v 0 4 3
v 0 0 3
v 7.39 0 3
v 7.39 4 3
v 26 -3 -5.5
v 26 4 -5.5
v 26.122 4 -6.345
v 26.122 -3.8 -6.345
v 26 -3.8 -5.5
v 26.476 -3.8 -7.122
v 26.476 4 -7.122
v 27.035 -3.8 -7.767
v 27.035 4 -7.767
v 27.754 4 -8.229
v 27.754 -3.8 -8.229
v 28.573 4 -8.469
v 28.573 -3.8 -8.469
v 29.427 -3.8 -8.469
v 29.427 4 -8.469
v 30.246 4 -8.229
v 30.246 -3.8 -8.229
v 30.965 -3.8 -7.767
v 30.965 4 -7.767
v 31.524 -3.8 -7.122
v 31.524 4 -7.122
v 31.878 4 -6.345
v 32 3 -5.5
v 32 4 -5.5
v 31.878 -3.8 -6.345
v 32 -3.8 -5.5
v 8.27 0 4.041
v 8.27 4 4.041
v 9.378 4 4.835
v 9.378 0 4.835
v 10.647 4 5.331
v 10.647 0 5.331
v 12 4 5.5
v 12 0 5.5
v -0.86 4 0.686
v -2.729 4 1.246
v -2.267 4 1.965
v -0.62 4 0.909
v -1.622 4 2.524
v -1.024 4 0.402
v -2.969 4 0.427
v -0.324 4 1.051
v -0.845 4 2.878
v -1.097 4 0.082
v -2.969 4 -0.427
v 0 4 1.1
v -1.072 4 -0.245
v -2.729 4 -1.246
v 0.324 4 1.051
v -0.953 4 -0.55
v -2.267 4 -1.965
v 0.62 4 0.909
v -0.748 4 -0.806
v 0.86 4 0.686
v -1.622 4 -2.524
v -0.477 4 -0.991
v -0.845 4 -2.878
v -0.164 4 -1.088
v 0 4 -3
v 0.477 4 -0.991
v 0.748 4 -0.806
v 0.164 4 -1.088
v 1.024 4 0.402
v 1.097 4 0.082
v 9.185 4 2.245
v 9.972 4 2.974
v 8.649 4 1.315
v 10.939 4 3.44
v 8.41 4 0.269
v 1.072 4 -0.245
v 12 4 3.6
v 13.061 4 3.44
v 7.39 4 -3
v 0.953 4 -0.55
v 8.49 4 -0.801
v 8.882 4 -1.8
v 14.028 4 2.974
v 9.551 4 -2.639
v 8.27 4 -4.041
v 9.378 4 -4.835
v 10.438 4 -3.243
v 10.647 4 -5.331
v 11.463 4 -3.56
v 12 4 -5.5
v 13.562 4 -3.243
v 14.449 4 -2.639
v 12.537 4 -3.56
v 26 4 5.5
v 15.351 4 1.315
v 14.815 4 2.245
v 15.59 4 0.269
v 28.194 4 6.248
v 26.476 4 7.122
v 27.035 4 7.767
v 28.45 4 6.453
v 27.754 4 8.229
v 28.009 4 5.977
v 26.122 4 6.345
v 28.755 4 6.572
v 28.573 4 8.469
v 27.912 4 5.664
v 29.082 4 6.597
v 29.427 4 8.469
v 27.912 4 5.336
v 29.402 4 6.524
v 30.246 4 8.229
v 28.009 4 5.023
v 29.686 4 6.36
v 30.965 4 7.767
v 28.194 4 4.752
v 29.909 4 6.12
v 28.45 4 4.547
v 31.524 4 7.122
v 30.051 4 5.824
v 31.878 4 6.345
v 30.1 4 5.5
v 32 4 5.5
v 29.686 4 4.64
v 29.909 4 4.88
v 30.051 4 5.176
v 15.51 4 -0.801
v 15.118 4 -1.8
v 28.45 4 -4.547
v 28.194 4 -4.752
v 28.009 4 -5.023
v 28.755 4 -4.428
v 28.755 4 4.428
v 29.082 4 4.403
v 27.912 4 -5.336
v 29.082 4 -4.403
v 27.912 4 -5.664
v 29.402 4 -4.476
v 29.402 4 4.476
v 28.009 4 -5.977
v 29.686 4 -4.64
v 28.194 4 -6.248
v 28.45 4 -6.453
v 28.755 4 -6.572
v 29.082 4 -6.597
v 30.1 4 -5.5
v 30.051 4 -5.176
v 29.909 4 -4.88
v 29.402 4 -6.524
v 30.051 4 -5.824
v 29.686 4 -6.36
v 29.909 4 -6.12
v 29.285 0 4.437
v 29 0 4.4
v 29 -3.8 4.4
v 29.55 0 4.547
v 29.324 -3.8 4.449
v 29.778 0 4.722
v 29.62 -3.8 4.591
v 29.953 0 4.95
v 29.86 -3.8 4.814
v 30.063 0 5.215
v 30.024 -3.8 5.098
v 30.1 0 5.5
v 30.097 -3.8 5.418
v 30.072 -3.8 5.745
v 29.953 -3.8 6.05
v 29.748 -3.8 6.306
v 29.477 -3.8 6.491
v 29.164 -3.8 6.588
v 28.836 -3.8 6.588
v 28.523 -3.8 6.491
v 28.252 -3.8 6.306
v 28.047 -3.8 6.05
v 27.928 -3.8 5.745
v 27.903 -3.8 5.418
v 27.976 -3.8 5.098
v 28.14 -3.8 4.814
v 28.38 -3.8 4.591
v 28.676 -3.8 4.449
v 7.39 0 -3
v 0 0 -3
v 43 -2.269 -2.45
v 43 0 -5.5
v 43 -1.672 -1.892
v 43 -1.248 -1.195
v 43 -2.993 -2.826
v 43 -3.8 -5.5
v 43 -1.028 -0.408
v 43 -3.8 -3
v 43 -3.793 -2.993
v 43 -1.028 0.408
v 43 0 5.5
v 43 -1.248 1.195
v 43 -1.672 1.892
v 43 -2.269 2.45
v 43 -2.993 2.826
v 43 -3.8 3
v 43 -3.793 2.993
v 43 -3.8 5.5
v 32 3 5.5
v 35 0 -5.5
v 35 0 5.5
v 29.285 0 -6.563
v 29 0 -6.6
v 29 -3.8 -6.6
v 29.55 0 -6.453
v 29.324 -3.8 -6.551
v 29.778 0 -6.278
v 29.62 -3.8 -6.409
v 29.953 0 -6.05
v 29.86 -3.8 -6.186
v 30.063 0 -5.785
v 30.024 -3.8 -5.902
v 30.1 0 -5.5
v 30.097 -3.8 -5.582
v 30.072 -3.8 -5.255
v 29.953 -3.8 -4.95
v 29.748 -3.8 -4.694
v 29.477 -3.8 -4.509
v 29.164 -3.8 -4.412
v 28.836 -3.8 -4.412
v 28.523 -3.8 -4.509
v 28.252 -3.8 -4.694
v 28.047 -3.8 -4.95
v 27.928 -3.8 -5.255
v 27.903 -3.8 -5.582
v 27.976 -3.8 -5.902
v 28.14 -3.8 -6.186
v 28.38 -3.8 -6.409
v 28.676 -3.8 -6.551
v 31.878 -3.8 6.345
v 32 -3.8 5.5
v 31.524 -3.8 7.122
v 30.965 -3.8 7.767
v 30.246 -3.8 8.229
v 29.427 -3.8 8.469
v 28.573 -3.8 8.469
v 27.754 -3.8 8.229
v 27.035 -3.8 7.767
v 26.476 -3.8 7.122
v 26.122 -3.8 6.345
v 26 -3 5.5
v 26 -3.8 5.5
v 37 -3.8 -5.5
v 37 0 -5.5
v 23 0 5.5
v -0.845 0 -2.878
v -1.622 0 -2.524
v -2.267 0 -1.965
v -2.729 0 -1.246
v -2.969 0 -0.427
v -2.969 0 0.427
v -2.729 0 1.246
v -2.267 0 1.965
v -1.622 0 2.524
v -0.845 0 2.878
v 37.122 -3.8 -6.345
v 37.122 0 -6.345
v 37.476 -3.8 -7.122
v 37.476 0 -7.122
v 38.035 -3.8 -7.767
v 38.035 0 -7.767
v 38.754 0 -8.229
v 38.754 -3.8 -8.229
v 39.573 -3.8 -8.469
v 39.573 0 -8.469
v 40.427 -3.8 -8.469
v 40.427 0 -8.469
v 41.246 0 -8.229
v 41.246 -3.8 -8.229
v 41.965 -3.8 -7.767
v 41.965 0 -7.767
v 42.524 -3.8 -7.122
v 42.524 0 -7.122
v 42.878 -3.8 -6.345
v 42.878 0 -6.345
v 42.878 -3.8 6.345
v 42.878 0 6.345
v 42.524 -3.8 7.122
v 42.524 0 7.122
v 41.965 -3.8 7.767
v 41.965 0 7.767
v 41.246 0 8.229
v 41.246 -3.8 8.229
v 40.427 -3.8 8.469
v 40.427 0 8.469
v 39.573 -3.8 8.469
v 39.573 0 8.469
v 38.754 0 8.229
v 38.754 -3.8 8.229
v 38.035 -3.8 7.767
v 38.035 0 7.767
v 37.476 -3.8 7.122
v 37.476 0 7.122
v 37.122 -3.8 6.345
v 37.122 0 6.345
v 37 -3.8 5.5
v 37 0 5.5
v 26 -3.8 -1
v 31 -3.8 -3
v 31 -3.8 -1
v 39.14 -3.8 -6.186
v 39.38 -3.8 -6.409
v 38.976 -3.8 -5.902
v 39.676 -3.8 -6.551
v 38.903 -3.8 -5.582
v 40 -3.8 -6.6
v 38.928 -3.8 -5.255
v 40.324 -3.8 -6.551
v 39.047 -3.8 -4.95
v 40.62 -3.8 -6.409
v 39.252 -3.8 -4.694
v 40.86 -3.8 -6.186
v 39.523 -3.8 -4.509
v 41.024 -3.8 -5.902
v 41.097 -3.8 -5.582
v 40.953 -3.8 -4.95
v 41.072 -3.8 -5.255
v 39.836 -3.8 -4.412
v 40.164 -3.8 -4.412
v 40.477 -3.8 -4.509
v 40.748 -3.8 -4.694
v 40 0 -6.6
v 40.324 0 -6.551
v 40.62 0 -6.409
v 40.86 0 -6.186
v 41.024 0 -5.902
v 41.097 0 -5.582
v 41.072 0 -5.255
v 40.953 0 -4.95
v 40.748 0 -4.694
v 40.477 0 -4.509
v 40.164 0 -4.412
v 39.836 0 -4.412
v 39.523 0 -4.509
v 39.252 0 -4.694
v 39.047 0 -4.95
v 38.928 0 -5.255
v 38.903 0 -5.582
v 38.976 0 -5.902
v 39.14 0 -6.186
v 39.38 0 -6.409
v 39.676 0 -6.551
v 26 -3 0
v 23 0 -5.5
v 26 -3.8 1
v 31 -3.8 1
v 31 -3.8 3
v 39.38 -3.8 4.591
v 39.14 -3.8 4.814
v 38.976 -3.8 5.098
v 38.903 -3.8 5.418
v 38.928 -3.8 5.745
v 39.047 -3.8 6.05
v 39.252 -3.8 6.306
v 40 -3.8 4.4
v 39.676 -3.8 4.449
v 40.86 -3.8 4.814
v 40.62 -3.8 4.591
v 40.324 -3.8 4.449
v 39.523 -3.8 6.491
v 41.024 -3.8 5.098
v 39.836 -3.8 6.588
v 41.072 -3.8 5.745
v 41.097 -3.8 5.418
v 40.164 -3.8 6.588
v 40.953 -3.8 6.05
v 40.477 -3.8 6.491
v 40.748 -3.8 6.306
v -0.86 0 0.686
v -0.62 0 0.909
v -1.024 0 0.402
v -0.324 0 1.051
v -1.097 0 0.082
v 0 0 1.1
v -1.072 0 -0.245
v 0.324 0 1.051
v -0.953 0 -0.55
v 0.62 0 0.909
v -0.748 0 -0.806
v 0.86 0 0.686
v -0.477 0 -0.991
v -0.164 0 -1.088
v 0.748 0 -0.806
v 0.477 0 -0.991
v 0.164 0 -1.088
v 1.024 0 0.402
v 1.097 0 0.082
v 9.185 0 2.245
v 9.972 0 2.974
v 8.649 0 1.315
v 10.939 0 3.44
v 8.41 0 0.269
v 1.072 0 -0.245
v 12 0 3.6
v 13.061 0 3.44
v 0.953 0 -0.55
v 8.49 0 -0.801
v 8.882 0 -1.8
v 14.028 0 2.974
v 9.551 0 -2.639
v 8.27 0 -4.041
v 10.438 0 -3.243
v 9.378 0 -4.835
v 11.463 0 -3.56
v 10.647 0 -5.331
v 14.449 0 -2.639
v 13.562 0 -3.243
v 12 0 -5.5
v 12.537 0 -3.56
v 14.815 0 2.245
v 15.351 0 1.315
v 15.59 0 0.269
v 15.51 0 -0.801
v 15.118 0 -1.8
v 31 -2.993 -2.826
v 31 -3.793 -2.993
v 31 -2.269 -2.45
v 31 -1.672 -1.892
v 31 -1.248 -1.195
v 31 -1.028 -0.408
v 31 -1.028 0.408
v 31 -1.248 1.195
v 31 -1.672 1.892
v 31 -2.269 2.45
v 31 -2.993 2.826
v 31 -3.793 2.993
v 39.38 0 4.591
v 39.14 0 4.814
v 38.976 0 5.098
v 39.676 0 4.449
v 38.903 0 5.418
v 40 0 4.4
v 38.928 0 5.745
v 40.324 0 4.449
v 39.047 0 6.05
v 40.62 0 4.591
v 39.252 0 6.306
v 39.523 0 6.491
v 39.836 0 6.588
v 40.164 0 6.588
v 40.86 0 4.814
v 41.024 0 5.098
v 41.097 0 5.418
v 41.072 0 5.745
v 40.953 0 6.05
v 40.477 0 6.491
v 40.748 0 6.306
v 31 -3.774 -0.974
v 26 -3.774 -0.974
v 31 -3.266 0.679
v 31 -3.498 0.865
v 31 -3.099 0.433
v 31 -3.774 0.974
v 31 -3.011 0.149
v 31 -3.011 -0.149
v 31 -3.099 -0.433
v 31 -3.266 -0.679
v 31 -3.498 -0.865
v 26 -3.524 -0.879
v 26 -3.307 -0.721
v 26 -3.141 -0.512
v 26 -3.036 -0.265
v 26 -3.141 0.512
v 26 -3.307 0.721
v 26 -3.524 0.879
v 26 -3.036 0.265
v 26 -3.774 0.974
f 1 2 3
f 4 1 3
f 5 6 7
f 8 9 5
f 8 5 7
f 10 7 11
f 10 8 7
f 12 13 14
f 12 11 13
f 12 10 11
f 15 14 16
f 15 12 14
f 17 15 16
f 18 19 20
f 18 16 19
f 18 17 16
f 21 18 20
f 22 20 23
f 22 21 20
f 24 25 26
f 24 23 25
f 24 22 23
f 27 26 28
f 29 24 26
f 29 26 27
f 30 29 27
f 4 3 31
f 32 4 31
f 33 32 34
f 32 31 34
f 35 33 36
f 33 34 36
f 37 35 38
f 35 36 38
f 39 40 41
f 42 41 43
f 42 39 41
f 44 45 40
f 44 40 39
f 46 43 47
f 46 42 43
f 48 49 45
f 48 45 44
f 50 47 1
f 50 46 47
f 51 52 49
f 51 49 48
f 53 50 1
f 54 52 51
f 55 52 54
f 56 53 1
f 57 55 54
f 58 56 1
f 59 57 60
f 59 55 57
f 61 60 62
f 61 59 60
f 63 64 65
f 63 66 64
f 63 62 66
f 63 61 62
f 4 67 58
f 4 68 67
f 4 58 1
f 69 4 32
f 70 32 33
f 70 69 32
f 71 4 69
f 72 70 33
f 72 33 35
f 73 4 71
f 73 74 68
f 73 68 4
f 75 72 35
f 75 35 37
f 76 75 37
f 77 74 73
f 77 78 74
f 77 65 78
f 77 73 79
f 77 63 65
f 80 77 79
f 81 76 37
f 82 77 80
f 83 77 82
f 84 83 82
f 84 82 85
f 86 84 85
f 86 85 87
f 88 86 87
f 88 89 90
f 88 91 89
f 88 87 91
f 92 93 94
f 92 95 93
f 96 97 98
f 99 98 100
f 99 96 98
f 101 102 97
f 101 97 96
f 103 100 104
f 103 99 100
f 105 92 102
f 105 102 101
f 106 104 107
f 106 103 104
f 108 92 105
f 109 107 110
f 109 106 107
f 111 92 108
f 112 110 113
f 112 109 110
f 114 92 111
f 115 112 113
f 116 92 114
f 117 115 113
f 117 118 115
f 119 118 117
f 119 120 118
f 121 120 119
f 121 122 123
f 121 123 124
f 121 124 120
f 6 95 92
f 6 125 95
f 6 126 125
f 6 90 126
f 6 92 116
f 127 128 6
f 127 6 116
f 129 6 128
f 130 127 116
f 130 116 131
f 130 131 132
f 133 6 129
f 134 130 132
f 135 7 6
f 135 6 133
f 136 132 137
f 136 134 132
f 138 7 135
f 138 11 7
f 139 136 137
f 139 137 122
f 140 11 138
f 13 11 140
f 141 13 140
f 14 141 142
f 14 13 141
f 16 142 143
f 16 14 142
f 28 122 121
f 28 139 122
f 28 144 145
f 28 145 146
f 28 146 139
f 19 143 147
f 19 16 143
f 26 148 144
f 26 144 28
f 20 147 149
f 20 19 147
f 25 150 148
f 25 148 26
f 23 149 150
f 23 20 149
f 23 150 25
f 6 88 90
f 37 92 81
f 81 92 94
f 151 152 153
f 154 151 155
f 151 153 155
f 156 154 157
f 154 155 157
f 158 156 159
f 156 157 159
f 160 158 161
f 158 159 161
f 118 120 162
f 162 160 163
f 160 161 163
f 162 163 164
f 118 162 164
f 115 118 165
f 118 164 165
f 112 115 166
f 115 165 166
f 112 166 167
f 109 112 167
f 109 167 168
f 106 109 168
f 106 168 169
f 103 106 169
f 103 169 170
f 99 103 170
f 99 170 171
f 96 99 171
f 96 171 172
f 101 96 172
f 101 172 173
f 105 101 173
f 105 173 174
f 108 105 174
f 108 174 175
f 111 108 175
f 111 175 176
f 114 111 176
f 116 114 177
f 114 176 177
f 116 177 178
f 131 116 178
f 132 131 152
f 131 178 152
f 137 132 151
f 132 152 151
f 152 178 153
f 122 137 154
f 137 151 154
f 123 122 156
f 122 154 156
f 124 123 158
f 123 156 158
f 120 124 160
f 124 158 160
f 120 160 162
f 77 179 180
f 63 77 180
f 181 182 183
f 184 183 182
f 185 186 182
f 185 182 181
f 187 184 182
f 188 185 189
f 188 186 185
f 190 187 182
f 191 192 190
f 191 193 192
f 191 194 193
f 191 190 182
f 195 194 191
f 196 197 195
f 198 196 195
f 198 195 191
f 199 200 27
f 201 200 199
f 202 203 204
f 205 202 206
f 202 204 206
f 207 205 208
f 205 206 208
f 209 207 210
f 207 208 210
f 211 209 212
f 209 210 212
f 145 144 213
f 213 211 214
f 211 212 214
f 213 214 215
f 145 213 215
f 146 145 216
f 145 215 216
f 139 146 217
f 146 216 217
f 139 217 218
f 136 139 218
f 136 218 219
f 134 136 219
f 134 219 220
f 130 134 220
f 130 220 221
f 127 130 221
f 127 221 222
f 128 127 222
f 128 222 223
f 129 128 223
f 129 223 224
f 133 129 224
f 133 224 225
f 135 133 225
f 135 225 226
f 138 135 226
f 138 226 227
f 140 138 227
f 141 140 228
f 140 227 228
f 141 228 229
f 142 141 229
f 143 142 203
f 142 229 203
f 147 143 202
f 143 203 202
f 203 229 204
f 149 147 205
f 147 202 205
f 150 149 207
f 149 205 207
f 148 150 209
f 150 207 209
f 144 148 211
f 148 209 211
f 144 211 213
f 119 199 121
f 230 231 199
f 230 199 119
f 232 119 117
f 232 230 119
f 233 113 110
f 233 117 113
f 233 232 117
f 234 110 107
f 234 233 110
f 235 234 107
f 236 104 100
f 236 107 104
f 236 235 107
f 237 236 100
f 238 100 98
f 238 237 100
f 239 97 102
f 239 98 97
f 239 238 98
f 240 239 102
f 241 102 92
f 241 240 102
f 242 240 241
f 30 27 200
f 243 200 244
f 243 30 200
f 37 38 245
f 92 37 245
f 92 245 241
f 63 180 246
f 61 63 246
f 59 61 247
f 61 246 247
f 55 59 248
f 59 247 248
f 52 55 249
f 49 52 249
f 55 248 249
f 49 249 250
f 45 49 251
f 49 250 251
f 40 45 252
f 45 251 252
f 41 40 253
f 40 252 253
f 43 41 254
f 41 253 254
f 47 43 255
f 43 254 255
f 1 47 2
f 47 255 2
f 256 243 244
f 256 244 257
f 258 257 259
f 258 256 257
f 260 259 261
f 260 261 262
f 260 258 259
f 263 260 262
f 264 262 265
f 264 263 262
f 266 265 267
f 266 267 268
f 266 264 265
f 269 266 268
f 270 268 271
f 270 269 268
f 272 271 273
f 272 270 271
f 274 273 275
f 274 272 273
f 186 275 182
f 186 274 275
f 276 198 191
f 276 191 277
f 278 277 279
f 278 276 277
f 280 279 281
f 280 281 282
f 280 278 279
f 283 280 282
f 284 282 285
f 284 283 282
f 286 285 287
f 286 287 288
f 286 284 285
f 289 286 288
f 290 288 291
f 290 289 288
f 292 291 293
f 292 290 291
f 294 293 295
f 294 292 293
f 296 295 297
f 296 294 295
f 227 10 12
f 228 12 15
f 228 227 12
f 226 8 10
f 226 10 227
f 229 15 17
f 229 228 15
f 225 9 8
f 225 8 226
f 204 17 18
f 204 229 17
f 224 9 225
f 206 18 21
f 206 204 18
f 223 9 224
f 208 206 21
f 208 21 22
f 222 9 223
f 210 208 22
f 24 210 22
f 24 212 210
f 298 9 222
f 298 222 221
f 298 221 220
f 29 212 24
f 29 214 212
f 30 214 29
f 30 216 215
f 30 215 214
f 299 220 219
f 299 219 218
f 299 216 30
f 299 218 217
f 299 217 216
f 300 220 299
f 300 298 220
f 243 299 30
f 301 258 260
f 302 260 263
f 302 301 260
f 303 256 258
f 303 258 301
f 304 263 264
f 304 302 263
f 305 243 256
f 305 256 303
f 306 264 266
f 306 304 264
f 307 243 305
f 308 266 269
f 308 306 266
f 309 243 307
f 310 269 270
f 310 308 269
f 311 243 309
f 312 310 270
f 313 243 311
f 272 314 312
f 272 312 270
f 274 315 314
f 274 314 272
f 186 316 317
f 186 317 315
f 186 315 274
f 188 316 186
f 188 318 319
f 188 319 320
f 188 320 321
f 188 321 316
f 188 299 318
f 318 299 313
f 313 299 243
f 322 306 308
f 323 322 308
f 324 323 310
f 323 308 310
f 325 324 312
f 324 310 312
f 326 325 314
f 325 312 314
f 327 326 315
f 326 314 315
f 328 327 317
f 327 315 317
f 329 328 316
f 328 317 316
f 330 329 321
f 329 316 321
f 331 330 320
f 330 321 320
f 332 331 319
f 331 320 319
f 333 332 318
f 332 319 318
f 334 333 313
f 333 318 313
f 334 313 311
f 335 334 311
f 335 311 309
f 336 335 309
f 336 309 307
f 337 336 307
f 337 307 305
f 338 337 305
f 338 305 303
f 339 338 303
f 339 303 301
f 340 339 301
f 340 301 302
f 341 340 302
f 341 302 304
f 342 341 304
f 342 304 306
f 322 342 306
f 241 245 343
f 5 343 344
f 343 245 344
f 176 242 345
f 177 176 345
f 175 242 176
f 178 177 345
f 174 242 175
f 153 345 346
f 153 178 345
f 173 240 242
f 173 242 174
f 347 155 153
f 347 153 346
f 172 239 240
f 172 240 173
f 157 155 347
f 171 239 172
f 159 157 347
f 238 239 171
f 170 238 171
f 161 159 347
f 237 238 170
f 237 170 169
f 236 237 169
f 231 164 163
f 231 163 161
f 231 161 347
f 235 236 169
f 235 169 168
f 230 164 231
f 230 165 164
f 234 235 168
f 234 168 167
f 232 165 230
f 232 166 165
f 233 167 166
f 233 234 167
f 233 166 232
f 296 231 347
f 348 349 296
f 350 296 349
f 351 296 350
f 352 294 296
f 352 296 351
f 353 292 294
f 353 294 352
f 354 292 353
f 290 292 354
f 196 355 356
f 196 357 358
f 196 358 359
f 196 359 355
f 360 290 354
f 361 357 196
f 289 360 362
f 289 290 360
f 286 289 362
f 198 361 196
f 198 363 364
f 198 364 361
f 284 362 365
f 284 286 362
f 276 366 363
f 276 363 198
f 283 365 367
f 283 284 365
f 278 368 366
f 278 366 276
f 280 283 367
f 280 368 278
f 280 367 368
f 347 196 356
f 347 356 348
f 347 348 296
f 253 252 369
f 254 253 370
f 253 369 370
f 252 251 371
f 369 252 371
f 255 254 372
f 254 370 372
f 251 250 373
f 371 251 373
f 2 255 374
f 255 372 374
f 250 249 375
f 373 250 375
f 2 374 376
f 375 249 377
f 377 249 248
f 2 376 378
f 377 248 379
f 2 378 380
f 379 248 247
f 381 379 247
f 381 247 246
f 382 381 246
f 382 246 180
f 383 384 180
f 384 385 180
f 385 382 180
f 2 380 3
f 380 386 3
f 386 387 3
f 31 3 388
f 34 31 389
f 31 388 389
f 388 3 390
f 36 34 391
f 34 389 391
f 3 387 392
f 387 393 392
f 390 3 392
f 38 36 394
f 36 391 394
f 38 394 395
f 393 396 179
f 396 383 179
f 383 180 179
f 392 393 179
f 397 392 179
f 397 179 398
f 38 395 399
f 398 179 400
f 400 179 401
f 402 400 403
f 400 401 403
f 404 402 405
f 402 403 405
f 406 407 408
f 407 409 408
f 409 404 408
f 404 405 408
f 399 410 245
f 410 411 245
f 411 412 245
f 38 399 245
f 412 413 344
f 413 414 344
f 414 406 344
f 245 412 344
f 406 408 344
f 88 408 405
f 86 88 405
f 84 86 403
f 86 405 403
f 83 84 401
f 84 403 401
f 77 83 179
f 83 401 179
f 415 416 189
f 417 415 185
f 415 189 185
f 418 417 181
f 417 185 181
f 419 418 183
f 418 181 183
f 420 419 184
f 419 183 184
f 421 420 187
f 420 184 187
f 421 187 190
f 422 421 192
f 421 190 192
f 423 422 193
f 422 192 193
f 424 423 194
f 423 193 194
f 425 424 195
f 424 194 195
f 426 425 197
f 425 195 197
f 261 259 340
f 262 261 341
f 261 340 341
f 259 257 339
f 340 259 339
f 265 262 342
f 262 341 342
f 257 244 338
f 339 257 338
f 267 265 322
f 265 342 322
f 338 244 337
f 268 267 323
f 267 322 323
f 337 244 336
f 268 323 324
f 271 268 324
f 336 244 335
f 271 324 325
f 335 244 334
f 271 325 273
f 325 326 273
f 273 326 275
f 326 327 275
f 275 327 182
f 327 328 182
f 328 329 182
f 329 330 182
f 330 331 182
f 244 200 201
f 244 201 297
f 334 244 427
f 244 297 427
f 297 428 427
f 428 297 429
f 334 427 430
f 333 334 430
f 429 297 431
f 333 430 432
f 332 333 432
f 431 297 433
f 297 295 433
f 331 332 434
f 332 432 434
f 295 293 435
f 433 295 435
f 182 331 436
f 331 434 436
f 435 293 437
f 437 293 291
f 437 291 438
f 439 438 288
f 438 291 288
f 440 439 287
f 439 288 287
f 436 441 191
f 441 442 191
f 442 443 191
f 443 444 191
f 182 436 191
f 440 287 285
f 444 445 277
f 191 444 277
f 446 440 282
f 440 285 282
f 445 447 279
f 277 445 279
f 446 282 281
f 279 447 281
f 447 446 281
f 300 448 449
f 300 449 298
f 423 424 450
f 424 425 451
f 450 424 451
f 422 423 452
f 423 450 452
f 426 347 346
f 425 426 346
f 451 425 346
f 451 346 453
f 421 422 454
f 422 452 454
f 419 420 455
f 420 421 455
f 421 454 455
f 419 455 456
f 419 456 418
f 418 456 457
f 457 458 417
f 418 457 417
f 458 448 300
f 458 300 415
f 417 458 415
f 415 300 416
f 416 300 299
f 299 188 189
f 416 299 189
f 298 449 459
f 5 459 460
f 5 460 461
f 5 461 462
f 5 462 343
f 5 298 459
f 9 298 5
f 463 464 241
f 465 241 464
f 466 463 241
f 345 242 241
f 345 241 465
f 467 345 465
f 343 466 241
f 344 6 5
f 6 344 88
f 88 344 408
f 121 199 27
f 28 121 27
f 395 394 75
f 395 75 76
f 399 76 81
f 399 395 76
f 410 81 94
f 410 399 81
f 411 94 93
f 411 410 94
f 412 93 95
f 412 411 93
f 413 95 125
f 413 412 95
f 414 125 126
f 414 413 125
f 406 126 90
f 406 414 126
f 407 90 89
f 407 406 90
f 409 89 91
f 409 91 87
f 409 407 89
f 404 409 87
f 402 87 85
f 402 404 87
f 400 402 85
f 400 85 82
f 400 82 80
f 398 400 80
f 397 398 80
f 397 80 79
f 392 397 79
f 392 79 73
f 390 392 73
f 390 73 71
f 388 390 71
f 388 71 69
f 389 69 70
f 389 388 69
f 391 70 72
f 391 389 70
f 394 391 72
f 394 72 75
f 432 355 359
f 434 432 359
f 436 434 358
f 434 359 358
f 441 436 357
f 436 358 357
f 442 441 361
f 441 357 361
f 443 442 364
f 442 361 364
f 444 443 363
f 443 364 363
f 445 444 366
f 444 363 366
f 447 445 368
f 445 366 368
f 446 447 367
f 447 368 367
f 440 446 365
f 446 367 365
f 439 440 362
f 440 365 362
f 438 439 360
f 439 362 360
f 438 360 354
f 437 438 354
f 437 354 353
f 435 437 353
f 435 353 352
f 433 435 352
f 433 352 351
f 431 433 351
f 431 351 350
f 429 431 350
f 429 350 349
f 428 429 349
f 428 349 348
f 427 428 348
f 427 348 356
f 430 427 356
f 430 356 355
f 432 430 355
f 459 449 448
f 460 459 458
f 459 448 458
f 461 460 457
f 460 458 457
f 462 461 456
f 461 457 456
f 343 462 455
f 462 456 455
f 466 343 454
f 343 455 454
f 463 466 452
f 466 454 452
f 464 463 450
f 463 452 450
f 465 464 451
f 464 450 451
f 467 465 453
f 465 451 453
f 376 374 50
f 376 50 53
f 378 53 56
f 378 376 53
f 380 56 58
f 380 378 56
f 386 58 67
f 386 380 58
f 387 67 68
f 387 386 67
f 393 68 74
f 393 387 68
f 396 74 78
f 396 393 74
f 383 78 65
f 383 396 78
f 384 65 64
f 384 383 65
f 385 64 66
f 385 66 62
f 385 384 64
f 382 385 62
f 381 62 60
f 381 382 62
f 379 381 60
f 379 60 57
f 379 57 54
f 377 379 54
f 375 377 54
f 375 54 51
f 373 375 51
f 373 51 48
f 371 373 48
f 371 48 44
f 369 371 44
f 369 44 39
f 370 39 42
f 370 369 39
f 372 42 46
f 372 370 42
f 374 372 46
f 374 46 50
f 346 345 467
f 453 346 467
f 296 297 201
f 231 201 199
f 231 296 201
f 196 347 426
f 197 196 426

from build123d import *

# Parameters (mm, degrees)
SKETCH_1_R              = 3
SKETCH_1_R_2            = 1.1
SKETCH_1_R_3            = 5.5
SKETCH_1_R_4            = 3.6
EXTRUDE_1_DEPTH         = 4
EXTRUDE_START           = 4
SKETCH_2_R              = 1.1
EXTRUDE_2_DEPTH         = 4
CHAMFER_1_SIZE          = 3
SKETCH_3_R              = 3
CUT_EXTRUDE_1_DEPTH     = 12
SKETCH_4_R              = 1
CUT_EXTRUDE_2_DEPTH     = 12
CHAMFER_2_SIZE          = 0.2
CUT_EXTRUDE_START       = -0.2
CUT_EXTRUDE_3_OUTLINE_R = 1.1
CUT_EXTRUDE_3_DEPTH     = 0.2


with BuildPart() as part:
    # 草图1 → 凸台-拉伸1 (new body)
    # profile 1 of 12: a face of its own
    with BuildSketch(Plane(origin=(0, 0, 0), x_dir=(1, 0, 0), z_dir=(0, 1, 0))):
        Circle(SKETCH_1_R)
        with Locations(Location((0, 0, 0), (0, 0, 270))):
            Circle(SKETCH_1_R_2, mode=Mode.SUBTRACT)
    # profile 2 of 12: a face of its own
    with BuildSketch(Plane(origin=(0, 0, 0), x_dir=(1, 0, 0), z_dir=(0, 1, 0))):
        with BuildLine():
            Line((7.390227771, 3), (0, 3))
            ThreePointArc((0, 3), (2.121320344, 2.121320344), (3, 0))
            ThreePointArc((3, 0), (2.121320344, -2.121320344), (0, -3))
            Line((0, -3), (7.390227771, -3))
            ThreePointArc((7.390227771, -3), (6.5, 0), (7.390227771, 3))
        make_face()
    # profile 3 of 12: a face of its own
    with BuildSketch(Plane(origin=(0, 0, 0), x_dir=(1, 0, 0), z_dir=(0, 1, 0))):
        with Locations((12, 0)):
            Circle(SKETCH_1_R_3)
        with Locations(Location((12, 0, 0), (0, 0, 270))):
            Circle(SKETCH_1_R_4, mode=Mode.SUBTRACT)
    # profile 4 of 12: a face of its own
    with BuildSketch(Plane(origin=(0, 0, 0), x_dir=(1, 0, 0), z_dir=(0, 1, 0))):
        with BuildLine():
            Line((26, 5.5), (12, 5.5))
            ThreePointArc((12, 5.5), (15.889087297, 3.889087297), (17.5, 0))
            ThreePointArc((17.5, 0), (15.889087297, -3.889087297), (12, -5.5))
            Line((12, -5.5), (26, -5.5))
            ThreePointArc((26, -5.5), (29, -2.5), (32, -5.5))
            Line((32, -5.5), (32, 5.5))
            ThreePointArc((32, 5.5), (29, 2.5), (26, 5.5))
        make_face()
    # profile 5 of 12: a face of its own
    with BuildSketch(Plane(origin=(0, 0, 0), x_dir=(1, 0, 0), z_dir=(0, 1, 0))):
        with BuildLine():
            ThreePointArc((32, 5.5), (29, 8.5), (26, 5.5))
            Line((26, 5.5), (27.9, 5.5))
            ThreePointArc((27.9, 5.5), (29, 6.6), (30.1, 5.5))
            Line((30.1, 5.5), (32, 5.5))
        make_face()
    # profile 6 of 12: a face of its own
    with BuildSketch(Plane(origin=(0, 0, 0), x_dir=(1, 0, 0), z_dir=(0, 1, 0))):
        with BuildLine():
            Line((27.9, 5.5), (26, 5.5))
            ThreePointArc((26, 5.5), (29, 2.5), (32, 5.5))
            Line((32, 5.5), (30.1, 5.5))
            ThreePointArc((30.1, 5.5), (29, 4.4), (27.9, 5.5))
        make_face()
    # profile 7 of 12: a face of its own
    with BuildSketch(Plane(origin=(0, 0, 0), x_dir=(1, 0, 0), z_dir=(0, 1, 0))):
        with BuildLine():
            ThreePointArc((32, 5.5), (29, 8.5), (26, 5.5))
            Line((26, 5.5), (27.9, 5.5))
            ThreePointArc((27.9, 5.5), (29, 6.6), (30.1, 5.5))
            Line((30.1, 5.5), (32, 5.5))
        make_face()
    # profile 8 of 12: a face of its own
    with BuildSketch(Plane(origin=(0, 0, 0), x_dir=(1, 0, 0), z_dir=(0, 1, 0))):
        with BuildLine():
            Line((27.9, 5.5), (26, 5.5))
            ThreePointArc((26, 5.5), (29, 2.5), (32, 5.5))
            Line((32, 5.5), (30.1, 5.5))
            ThreePointArc((30.1, 5.5), (29, 4.4), (27.9, 5.5))
        make_face()
    # profile 9 of 12: a face of its own
    with BuildSketch(Plane(origin=(0, 0, 0), x_dir=(1, 0, 0), z_dir=(0, 1, 0))):
        with BuildLine():
            ThreePointArc((32, -5.5), (29, -2.5), (26, -5.5))
            Line((26, -5.5), (27.9, -5.5))
            ThreePointArc((27.9, -5.5), (29, -4.4), (30.1, -5.5))
            Line((30.1, -5.5), (32, -5.5))
        make_face()
    # profile 10 of 12: a face of its own
    with BuildSketch(Plane(origin=(0, 0, 0), x_dir=(1, 0, 0), z_dir=(0, 1, 0))):
        with BuildLine():
            Line((27.9, -5.5), (26, -5.5))
            ThreePointArc((26, -5.5), (29, -8.5), (32, -5.5))
            Line((32, -5.5), (30.1, -5.5))
            ThreePointArc((30.1, -5.5), (29, -6.6), (27.9, -5.5))
        make_face()
    # profile 11 of 12: a face of its own
    with BuildSketch(Plane(origin=(0, 0, 0), x_dir=(1, 0, 0), z_dir=(0, 1, 0))):
        with BuildLine():
            ThreePointArc((32, -5.5), (29, -2.5), (26, -5.5))
            Line((26, -5.5), (27.9, -5.5))
            ThreePointArc((27.9, -5.5), (29, -4.4), (30.1, -5.5))
            Line((30.1, -5.5), (32, -5.5))
        make_face()
    # profile 12 of 12: a face of its own
    with BuildSketch(Plane(origin=(0, 0, 0), x_dir=(1, 0, 0), z_dir=(0, 1, 0))):
        with BuildLine():
            Line((27.9, -5.5), (26, -5.5))
            ThreePointArc((26, -5.5), (29, -8.5), (32, -5.5))
            Line((32, -5.5), (30.1, -5.5))
            ThreePointArc((30.1, -5.5), (29, -6.6), (27.9, -5.5))
        make_face()
    extrude(amount=EXTRUDE_1_DEPTH)

    # 草图2 → 凸台-拉伸2 (add)
    # profile 1 of 3: a face of its own
    with BuildSketch(Plane.XZ.offset(EXTRUDE_START)):
        with BuildLine():
            Line((26, 5.5), (26, -5.5))
            ThreePointArc((26, -5.5), (29, -8.5), (32, -5.5))
            Line((32, -5.5), (32, 5.5))
            ThreePointArc((32, 5.5), (29, 8.5), (26, 5.5))
        make_face()
        with Locations(Location((29, 5.5, 0), (0, 0, 270))):
            Circle(SKETCH_2_R, mode=Mode.SUBTRACT)
        with Locations(Location((29, -5.5, 0), (0, 0, 270))):
            Circle(SKETCH_2_R, mode=Mode.SUBTRACT)
    # profile 2 of 3: a face of its own
    with BuildSketch(Plane.XZ.offset(EXTRUDE_START)):
        with BuildLine():
            Line((37, 5.5), (32, 5.5))
            Line((32, 5.5), (32, 0))
            Line((32, 0), (43, 0))
            Line((43, 0), (43, 5.5))
            ThreePointArc((43, 5.5), (40, 8.5), (37, 5.5))
        make_face()
        with Locations(Location((40, 5.5, 0), (0, 0, 270))):
            Circle(SKETCH_2_R, mode=Mode.SUBTRACT)
    # profile 3 of 3: a face of its own
    with BuildSketch(Plane.XZ.offset(EXTRUDE_START)):
        with BuildLine():
            Line((32, 0), (32, -5.5))
            Line((32, -5.5), (37, -5.5))
            ThreePointArc((37, -5.5), (40, -8.5), (43, -5.5))
            Line((43, -5.5), (43, 0))
            Line((43, 0), (32, 0))
        make_face()
        with Locations(Location((40, -5.5, 0), (0, 0, 270))):
            Circle(SKETCH_2_R, mode=Mode.SUBTRACT)
    extrude(amount=-EXTRUDE_2_DEPTH)

    # 倒角1
    chamfer_1_edges = [part.edges().sort_by_distance(p)[0] for p in [
        (32, 0, 0),
        (26, 0, 0),
    ]]
    chamfer(chamfer_1_edges, length=CHAMFER_1_SIZE)

    # 草图3 → 切除-拉伸1 (cut)
    with BuildSketch(Plane(origin=(43, 0, 0), x_dir=(0, 0, -1), z_dir=(1, 0, 0))):
        with Locations((0, -4)):
            Circle(SKETCH_3_R)
    extrude(amount=-CUT_EXTRUDE_1_DEPTH, mode=Mode.SUBTRACT)

    # 草图4 → 切除-拉伸2 (cut)
    with BuildSketch(Plane(origin=(31, 0, 0), x_dir=(0, 0, -1), z_dir=(1, 0, 0))):
        with Locations((0, -4)):
            Circle(SKETCH_4_R)
    extrude(amount=-CUT_EXTRUDE_2_DEPTH, mode=Mode.SUBTRACT)

    # 倒角2
    # the kernel refuses this chamfer: 0.2 mm, written as the material it takes off along each edge
    with BuildSketch(Plane(origin=(31, -4, 3), x_dir=(0, 0, 1), z_dir=(1, 0, 0)), Plane(origin=(43.53300923, -4, -3), x_dir=(0, 0, -1), z_dir=(-1, 0, 0))) as chamfer_2_piece_1:
        with BuildLine():
            Line((CHAMFER_2_SIZE, 0), (-0.007161172, -0.207161172))
            ThreePointArc((-0.007161172, -0.207161172), (-0.001893441, -0.106569522), (0, 0))
            Line((0, 0), (CHAMFER_2_SIZE, 0))
        make_face()
    extrude(amount=12.53300923, mode=Mode.SUBTRACT)
    with BuildSketch(Plane(origin=(31.584058146, -4, -1), x_dir=(0, 0.9935204423355923, 0.11365355542739984), z_dir=(-1, 0, 0))) as chamfer_2_piece_2:
        with BuildLine():
            Line((0.227307111, 0), (-CHAMFER_2_SIZE * 0.113653555427, CHAMFER_2_SIZE * 0.993520442336))
            Line((-CHAMFER_2_SIZE * 0.113653555427, CHAMFER_2_SIZE * 0.993520442336), (0, 0))
            ThreePointArc((0, 0), (0.116813439, 0.006474565), (0.227307111, 0))
        make_face()
    extrude(amount=6.168116293, mode=Mode.SUBTRACT)
    with BuildSketch(Plane(origin=(25.415941854, -4, 1), x_dir=(0, 0, 1), z_dir=(1, 0, 0))) as chamfer_2_piece_3:
        with BuildLine():
            Line((CHAMFER_2_SIZE, 0), (-0.025834261, -0.225834261))
            ThreePointArc((-0.025834261, -0.225834261), (-0.00684365, -0.116792397), (0, 0))
            Line((0, 0), (CHAMFER_2_SIZE, 0))
        make_face()
    extrude(amount=6.168116293, mode=Mode.SUBTRACT)

    # 切除-拉伸3: read off the stored shape, not the designer's step
    # 切除-拉伸3 outline → 切除-拉伸3 (cut)
    with BuildSketch(Plane.XZ.offset(4).offset(CUT_EXTRUDE_START)):
        with BuildLine():
            Line((26, 5.5), (26, -5.5))
            ThreePointArc((26, -5.5), (29, -8.5), (32, -5.5))
            Line((32, -5.5), (37, -5.5))
            ThreePointArc((37, -5.5), (40, -8.5), (43, -5.5))
            Line((43, -5.5), (43, 5.5))
            ThreePointArc((43, 5.5), (40, 8.5), (37, 5.5))
            Line((37, 5.5), (32, 5.5))
            ThreePointArc((32, 5.5), (29, 8.5), (26, 5.5))
        make_face()
        with Locations((29, -5.5)):
            Circle(CUT_EXTRUDE_3_OUTLINE_R, mode=Mode.SUBTRACT)
        with Locations((40, -5.5)):
            Circle(CUT_EXTRUDE_3_OUTLINE_R, mode=Mode.SUBTRACT)
        with Locations((29, 5.5)):
            Circle(CUT_EXTRUDE_3_OUTLINE_R, mode=Mode.SUBTRACT)
        with Locations((40, 5.5)):
            Circle(CUT_EXTRUDE_3_OUTLINE_R, mode=Mode.SUBTRACT)
    extrude(amount=CUT_EXTRUDE_3_DEPTH, mode=Mode.SUBTRACT)


solid = part.part
